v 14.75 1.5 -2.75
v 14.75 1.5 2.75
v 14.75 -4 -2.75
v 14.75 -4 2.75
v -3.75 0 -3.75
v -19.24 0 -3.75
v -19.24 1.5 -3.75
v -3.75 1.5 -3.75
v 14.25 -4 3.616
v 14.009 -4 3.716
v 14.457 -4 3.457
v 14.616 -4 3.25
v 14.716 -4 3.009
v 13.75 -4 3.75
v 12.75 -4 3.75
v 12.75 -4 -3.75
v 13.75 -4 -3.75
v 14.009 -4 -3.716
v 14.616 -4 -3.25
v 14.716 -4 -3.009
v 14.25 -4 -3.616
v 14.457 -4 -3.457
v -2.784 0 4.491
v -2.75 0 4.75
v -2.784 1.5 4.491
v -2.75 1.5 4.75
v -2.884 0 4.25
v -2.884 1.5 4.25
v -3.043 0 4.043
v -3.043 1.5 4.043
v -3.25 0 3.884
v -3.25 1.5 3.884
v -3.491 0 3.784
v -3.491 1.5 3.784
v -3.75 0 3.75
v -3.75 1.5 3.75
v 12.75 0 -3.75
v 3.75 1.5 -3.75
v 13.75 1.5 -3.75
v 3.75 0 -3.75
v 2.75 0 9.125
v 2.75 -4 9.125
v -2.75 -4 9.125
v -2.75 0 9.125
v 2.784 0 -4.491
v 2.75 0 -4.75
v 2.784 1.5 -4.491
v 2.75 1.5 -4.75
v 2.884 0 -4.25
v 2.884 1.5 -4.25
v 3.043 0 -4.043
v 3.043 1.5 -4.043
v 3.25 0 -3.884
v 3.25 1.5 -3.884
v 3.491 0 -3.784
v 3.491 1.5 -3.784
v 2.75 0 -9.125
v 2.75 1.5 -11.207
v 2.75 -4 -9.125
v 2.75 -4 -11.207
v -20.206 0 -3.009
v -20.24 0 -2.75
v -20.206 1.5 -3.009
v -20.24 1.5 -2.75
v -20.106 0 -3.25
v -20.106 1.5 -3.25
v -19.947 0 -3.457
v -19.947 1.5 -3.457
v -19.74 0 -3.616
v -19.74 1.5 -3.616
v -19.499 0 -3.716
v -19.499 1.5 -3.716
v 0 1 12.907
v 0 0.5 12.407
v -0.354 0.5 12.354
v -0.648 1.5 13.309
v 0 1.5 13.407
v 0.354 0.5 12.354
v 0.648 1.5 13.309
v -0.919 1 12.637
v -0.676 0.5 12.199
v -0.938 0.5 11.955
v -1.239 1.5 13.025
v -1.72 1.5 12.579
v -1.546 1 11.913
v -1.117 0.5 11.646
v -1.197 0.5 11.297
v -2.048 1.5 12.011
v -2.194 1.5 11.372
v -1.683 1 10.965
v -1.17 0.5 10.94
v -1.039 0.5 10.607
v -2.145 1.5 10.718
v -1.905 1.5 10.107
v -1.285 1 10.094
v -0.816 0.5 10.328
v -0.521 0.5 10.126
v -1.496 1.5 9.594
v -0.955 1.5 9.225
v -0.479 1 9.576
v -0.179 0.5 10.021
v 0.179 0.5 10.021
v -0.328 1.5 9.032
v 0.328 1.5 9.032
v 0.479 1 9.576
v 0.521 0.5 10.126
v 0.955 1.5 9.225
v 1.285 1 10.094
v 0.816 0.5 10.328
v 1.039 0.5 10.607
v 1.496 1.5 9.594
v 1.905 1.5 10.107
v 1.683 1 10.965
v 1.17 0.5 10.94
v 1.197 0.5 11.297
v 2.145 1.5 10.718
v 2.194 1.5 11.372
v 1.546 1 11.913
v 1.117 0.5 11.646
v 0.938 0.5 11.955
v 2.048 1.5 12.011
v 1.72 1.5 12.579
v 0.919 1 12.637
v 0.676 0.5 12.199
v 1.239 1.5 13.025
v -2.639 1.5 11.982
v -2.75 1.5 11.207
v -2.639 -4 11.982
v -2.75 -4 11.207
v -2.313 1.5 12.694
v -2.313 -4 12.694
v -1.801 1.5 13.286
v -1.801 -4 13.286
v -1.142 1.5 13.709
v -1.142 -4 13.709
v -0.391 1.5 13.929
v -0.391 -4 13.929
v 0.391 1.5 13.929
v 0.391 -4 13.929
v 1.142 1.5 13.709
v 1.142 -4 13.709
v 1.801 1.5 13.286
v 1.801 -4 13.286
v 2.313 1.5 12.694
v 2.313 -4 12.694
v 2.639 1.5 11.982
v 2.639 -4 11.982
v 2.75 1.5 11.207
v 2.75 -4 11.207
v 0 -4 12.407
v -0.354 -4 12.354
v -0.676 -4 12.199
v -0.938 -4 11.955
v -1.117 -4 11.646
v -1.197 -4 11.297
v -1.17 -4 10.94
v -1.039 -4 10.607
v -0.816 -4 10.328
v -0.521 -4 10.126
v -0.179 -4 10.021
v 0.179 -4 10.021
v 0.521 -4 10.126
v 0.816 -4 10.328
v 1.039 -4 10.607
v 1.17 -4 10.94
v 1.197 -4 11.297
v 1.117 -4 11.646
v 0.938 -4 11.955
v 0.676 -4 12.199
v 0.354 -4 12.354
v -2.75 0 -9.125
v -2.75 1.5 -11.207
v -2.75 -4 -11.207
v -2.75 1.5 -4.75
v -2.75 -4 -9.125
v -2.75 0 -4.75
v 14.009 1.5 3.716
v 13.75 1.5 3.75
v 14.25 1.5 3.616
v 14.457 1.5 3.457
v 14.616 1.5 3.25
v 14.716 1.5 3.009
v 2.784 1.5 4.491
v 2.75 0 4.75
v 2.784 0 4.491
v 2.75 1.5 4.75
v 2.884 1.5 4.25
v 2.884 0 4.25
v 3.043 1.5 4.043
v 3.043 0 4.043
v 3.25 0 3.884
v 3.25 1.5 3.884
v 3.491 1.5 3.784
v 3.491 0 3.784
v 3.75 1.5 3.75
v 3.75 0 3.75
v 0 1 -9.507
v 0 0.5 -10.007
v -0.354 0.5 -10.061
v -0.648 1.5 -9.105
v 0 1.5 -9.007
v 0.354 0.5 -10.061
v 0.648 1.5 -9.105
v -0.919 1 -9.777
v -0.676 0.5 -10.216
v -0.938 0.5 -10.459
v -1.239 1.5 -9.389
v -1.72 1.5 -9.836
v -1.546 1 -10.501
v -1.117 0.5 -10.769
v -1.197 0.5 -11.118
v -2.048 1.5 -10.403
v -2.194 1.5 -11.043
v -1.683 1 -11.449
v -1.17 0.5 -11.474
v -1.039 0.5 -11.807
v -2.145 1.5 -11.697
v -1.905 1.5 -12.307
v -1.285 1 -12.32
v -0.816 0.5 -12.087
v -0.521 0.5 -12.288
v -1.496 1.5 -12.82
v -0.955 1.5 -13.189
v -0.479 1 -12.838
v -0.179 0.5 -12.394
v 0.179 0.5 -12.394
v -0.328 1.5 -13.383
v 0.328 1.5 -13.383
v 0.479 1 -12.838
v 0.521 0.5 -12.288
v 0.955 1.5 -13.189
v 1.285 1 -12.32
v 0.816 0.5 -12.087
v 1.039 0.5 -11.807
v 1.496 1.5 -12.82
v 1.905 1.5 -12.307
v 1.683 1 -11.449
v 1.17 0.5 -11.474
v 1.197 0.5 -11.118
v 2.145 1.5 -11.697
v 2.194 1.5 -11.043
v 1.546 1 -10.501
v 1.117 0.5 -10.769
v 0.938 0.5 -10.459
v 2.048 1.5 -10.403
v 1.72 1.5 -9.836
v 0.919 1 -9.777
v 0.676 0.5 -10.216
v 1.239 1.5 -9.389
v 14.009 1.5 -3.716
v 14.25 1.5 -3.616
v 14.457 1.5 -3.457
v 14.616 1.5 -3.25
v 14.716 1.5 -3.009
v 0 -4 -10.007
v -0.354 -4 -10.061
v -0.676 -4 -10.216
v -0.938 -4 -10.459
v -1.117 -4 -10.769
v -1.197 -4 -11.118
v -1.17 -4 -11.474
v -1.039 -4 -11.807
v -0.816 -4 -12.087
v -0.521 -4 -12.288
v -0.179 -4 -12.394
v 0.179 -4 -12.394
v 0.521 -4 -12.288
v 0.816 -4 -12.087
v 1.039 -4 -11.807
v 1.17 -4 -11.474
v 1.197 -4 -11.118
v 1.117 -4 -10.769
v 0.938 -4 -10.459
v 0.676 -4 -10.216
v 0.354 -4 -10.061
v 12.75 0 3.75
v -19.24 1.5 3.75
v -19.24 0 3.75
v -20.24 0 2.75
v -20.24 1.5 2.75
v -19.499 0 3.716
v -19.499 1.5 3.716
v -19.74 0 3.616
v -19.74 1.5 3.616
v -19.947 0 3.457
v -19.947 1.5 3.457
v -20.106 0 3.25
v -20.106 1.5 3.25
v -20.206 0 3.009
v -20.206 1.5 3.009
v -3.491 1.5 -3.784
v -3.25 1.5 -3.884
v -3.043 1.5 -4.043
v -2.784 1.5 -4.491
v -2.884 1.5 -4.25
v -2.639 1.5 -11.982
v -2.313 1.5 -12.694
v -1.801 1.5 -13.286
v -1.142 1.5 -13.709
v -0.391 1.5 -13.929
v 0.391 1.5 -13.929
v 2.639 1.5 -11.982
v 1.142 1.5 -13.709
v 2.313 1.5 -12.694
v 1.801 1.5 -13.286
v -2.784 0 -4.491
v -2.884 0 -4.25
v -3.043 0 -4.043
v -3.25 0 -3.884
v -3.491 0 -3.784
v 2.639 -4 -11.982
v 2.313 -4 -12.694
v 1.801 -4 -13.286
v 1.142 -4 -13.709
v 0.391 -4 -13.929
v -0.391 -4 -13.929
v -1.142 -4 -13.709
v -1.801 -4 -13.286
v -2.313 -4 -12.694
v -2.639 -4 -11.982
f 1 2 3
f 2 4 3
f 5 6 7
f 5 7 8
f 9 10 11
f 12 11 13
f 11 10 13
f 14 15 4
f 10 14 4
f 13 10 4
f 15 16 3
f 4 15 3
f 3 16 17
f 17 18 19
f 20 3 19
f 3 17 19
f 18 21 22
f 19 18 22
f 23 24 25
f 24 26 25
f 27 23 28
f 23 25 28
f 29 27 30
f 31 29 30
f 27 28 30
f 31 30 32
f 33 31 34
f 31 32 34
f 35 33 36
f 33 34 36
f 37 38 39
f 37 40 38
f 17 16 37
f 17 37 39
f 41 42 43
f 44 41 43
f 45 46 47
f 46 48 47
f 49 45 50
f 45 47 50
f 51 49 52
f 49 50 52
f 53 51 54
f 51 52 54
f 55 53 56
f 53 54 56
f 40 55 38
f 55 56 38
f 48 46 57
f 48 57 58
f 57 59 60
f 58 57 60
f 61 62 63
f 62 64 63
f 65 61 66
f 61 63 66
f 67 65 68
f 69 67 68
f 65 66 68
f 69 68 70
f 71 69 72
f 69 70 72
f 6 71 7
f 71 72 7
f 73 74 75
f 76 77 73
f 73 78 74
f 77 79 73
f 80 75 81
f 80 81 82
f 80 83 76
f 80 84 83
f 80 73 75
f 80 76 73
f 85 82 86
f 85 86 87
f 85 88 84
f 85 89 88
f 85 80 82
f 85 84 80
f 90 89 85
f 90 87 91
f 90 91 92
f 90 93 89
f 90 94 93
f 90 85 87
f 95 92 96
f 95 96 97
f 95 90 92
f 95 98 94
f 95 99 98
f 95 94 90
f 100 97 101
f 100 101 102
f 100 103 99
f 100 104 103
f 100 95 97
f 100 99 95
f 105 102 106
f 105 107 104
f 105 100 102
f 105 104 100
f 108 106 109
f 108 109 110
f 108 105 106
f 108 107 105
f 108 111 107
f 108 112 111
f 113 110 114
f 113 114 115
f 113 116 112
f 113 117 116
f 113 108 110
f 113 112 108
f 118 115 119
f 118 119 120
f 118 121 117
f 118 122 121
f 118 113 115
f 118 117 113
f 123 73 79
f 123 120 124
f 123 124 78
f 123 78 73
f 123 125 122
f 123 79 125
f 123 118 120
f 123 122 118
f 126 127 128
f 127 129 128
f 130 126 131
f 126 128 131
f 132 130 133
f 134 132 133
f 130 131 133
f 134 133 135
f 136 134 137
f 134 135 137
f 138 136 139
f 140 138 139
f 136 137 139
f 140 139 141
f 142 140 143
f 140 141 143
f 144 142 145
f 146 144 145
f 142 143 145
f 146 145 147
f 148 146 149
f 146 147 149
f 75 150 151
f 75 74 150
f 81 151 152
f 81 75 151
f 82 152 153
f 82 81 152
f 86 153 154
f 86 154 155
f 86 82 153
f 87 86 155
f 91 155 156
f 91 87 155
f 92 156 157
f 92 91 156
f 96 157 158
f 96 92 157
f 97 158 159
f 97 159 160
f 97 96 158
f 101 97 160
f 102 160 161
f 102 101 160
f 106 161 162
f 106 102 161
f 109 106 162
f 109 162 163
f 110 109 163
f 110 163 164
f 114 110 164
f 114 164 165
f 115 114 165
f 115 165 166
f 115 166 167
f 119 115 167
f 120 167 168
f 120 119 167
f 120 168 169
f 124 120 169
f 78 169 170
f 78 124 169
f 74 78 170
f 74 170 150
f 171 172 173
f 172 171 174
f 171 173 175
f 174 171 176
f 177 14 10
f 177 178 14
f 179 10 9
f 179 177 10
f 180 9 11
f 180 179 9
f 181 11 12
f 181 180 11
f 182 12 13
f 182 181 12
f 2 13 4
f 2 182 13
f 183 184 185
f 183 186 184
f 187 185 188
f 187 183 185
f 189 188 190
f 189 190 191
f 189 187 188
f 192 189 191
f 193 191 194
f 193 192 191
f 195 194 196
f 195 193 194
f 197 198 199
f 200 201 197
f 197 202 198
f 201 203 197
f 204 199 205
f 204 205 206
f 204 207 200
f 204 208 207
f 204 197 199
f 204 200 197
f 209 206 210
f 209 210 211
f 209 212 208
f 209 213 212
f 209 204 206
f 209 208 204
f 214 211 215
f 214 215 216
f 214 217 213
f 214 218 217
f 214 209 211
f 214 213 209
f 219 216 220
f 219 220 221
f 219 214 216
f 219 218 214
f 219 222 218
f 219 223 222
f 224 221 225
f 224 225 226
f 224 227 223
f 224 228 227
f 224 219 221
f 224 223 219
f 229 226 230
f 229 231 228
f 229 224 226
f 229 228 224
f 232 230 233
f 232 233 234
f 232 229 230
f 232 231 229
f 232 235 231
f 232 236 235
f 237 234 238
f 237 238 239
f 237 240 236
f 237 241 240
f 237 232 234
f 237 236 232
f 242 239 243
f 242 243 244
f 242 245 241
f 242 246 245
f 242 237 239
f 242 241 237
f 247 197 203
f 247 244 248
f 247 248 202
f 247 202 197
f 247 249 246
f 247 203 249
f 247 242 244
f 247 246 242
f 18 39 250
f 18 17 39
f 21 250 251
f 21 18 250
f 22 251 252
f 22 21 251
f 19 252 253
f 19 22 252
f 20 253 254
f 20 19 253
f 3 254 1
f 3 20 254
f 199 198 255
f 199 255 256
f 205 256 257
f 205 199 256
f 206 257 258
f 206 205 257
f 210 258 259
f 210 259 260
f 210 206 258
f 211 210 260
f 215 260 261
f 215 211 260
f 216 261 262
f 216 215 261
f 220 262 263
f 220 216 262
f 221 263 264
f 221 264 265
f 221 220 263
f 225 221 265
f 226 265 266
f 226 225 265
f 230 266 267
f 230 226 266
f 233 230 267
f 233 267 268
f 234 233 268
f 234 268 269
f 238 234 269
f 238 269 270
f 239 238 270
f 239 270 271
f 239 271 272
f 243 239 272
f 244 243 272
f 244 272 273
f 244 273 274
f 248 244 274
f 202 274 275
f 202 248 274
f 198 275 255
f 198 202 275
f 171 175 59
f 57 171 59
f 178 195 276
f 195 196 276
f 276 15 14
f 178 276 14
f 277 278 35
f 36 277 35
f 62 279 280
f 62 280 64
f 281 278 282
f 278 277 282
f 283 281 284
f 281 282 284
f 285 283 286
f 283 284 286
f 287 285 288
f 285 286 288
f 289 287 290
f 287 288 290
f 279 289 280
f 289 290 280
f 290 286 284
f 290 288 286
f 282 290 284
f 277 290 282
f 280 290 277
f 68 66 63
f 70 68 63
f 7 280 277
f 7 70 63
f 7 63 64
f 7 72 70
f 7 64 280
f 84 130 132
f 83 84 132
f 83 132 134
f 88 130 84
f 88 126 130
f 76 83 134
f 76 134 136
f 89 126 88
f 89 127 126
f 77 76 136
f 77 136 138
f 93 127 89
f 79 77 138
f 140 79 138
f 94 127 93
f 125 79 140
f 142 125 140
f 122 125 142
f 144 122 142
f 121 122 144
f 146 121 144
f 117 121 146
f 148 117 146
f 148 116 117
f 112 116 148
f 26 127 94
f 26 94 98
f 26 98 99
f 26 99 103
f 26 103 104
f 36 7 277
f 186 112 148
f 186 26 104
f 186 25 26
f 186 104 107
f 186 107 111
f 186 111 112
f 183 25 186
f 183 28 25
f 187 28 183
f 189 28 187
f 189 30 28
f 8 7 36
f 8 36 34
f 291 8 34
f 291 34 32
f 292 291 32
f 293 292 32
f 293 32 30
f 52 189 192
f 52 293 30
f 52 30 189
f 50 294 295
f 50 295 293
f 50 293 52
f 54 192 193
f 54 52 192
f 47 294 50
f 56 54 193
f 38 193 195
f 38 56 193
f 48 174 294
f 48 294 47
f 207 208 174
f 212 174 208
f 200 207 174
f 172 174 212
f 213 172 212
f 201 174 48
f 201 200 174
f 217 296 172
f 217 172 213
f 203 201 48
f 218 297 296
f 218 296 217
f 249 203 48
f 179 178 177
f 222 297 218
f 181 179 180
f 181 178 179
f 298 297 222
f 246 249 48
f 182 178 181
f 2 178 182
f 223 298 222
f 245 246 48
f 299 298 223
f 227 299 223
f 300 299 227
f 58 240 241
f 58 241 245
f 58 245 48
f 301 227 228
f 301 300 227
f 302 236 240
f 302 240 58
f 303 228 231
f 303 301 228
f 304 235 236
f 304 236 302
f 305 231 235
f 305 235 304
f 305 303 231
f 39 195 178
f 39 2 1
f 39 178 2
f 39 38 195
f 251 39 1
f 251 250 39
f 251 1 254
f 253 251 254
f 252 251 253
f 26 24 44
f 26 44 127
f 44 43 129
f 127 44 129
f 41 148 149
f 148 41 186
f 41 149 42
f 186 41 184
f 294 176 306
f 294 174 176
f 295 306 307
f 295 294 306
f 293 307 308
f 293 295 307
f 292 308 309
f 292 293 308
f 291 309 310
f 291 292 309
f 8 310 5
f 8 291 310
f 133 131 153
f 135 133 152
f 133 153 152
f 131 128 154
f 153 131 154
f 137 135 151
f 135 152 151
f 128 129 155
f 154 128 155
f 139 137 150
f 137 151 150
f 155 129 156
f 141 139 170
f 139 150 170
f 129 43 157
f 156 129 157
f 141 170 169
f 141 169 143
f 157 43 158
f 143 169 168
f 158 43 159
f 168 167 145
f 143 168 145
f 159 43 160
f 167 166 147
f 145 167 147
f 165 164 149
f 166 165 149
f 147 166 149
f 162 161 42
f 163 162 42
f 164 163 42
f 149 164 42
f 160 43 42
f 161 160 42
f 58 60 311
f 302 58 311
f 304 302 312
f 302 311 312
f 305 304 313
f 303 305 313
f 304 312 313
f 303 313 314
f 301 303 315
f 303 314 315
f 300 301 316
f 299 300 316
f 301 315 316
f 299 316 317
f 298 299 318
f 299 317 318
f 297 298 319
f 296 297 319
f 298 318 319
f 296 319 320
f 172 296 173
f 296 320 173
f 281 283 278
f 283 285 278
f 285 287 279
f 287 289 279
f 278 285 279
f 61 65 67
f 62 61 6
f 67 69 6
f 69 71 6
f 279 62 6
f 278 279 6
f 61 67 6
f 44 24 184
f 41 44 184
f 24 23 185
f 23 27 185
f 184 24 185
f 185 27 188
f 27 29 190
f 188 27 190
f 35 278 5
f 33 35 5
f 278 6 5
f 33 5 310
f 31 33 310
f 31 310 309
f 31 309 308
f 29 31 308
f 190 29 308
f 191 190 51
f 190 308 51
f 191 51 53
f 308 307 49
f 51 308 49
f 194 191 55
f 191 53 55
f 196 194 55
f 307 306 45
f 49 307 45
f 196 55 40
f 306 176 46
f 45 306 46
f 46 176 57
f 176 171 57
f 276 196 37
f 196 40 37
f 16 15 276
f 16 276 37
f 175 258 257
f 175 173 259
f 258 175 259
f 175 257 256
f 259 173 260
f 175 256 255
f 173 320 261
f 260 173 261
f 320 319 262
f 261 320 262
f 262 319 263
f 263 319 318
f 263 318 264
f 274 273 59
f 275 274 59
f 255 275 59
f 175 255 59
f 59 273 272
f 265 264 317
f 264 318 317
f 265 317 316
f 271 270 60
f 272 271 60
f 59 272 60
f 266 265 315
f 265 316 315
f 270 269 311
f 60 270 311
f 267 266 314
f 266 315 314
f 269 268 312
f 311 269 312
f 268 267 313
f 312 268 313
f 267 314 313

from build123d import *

# Parameters (mm, degrees)
BOSS_EXTRUDE1_DEPTH                            = 1.5
BOSS_EXTRUDE2_START                            = -4
SKETCH1_4_W                                    = 2
SKETCH1_4_H                                    = 7.5
BOSS_EXTRUDE2_DEPTH                            = 4
CSK_FOR_M2_FLAT_HEAD_MACHINE_SCREW1_AT_2_COUNT = 2
CSK_FOR_M2_FLAT_HEAD_MACHINE_SCREW1_AT_2_PITCH = 22.4144
CSK_FOR_M2_FLAT_HEAD_MACHINE_SCREW1_AT_3_COUNT = 2
CSK_FOR_M2_FLAT_HEAD_MACHINE_SCREW1_AT_3_PITCH = 22.4144
FILLET1_R                                      = 1


with BuildPart() as part:
    # Sketch1 → Boss-Extrude1 (new body)
    with BuildSketch(Plane(origin=(0, 0, 0), x_dir=(1, 0, 0), z_dir=(0, 1, 0))):
        with BuildLine():
            ThreePointArc((2.75, 11.2072), (0, 13.9572), (-2.75, 11.2072))
            Line((-2.75, 11.2072), (-2.75, 3.75))
            Line((-2.75, 3.75), (-20.24, 3.75))
            Line((-20.24, 3.75), (-20.24, -3.75))
            Line((-20.24, -3.75), (-2.75, -3.75))
            Line((-2.75, -3.75), (-2.75, -11.2072))
            ThreePointArc((-2.75, -11.2072), (0, -13.9572), (2.75, -11.2072))
            Line((2.75, -11.2072), (2.75, -3.75))
            Line((2.75, -3.75), (14.75, -3.75))
            Line((14.75, -3.75), (14.75, 3.75))
            Line((14.75, 3.75), (2.75, 3.75))
            Line((2.75, 3.75), (2.75, 11.2072))
        make_face()
    extrude(amount=BOSS_EXTRUDE1_DEPTH)

    # Sketch1<4> → Boss-Extrude2 (add)
    with BuildSketch(Plane(origin=(0, 0, 0), x_dir=(1, 0, 0), z_dir=(0, 1, 0)).offset(BOSS_EXTRUDE2_START)):
        with BuildLine():
            Line((2.75, 9.125), (2.75, 11.2072))
            ThreePointArc((2.75, 11.2072), (0, 13.9572), (-2.75, 11.2072))
            Line((-2.75, 11.2072), (-2.75, 9.125))
            Line((-2.75, 9.125), (2.75, 9.125))
        make_face()
        with Locations((13.75, 0)):
            Rectangle(SKETCH1_4_W, SKETCH1_4_H)
        with BuildLine():
            Line((2.75, -11.2072), (2.75, -9.125))
            Line((2.75, -9.125), (-2.75, -9.125))
            Line((-2.75, -9.125), (-2.75, -11.2072))
            ThreePointArc((-2.75, -11.2072), (0, -13.9572), (2.75, -11.2072))
        make_face()
    extrude(amount=BOSS_EXTRUDE2_DEPTH)

    # Sketch3 → CSK for M2 Flat Head Machine Screw1 (revolve, cut)
    with BuildSketch(Plane(origin=(0, 1.5, 11.2072), x_dir=(0, 0, 1), z_dir=(1, 0, 0))):
        Polygon((0, 0), (0, 5.5), (1.2, 5.5), (1.2, 1), (2.2, 0), align=None)
    csk_for_m2_flat_head_machine_screw1 = revolve(axis=Axis((0, 7.85, 11.2072), (0, -1, 0)), mode=Mode.SUBTRACT)

    # CSK for M2 Flat Head Machine Screw1 at 2: CSK for M2 Flat Head Machine Screw1 ×2
    with Locations(*[(0, 0, -i * CSK_FOR_M2_FLAT_HEAD_MACHINE_SCREW1_AT_2_PITCH) for i in range(1, CSK_FOR_M2_FLAT_HEAD_MACHINE_SCREW1_AT_2_COUNT)]):
        add(csk_for_m2_flat_head_machine_screw1, mode=Mode.SUBTRACT)

    # CSK for M2 Flat Head Machine Screw1 at 3: CSK for M2 Flat Head Machine Screw1 ×2
    with Locations(*[(0, 0, -i * CSK_FOR_M2_FLAT_HEAD_MACHINE_SCREW1_AT_3_PITCH) for i in range(1, CSK_FOR_M2_FLAT_HEAD_MACHINE_SCREW1_AT_3_COUNT)]):
        add(csk_for_m2_flat_head_machine_screw1, mode=Mode.SUBTRACT)

    # Fillet1
    fillet1_edges = [part.edges().sort_by_distance(p)[0] for p in [
        (14.75, -1.25, 3.75),
        (2.75, 0.75, 3.75),
        (-2.75, 0.75, 3.75),
        (-20.24, 0.75, 3.75),
        (-20.24, 0.75, -3.75),
        (2.75, 0.75, -3.75),
        (14.75, -1.25, -3.75),
        (-2.75, 0.75, -3.75),
    ]]
    fillet(fillet1_edges, radius=FILLET1_R)


solid = part.part
